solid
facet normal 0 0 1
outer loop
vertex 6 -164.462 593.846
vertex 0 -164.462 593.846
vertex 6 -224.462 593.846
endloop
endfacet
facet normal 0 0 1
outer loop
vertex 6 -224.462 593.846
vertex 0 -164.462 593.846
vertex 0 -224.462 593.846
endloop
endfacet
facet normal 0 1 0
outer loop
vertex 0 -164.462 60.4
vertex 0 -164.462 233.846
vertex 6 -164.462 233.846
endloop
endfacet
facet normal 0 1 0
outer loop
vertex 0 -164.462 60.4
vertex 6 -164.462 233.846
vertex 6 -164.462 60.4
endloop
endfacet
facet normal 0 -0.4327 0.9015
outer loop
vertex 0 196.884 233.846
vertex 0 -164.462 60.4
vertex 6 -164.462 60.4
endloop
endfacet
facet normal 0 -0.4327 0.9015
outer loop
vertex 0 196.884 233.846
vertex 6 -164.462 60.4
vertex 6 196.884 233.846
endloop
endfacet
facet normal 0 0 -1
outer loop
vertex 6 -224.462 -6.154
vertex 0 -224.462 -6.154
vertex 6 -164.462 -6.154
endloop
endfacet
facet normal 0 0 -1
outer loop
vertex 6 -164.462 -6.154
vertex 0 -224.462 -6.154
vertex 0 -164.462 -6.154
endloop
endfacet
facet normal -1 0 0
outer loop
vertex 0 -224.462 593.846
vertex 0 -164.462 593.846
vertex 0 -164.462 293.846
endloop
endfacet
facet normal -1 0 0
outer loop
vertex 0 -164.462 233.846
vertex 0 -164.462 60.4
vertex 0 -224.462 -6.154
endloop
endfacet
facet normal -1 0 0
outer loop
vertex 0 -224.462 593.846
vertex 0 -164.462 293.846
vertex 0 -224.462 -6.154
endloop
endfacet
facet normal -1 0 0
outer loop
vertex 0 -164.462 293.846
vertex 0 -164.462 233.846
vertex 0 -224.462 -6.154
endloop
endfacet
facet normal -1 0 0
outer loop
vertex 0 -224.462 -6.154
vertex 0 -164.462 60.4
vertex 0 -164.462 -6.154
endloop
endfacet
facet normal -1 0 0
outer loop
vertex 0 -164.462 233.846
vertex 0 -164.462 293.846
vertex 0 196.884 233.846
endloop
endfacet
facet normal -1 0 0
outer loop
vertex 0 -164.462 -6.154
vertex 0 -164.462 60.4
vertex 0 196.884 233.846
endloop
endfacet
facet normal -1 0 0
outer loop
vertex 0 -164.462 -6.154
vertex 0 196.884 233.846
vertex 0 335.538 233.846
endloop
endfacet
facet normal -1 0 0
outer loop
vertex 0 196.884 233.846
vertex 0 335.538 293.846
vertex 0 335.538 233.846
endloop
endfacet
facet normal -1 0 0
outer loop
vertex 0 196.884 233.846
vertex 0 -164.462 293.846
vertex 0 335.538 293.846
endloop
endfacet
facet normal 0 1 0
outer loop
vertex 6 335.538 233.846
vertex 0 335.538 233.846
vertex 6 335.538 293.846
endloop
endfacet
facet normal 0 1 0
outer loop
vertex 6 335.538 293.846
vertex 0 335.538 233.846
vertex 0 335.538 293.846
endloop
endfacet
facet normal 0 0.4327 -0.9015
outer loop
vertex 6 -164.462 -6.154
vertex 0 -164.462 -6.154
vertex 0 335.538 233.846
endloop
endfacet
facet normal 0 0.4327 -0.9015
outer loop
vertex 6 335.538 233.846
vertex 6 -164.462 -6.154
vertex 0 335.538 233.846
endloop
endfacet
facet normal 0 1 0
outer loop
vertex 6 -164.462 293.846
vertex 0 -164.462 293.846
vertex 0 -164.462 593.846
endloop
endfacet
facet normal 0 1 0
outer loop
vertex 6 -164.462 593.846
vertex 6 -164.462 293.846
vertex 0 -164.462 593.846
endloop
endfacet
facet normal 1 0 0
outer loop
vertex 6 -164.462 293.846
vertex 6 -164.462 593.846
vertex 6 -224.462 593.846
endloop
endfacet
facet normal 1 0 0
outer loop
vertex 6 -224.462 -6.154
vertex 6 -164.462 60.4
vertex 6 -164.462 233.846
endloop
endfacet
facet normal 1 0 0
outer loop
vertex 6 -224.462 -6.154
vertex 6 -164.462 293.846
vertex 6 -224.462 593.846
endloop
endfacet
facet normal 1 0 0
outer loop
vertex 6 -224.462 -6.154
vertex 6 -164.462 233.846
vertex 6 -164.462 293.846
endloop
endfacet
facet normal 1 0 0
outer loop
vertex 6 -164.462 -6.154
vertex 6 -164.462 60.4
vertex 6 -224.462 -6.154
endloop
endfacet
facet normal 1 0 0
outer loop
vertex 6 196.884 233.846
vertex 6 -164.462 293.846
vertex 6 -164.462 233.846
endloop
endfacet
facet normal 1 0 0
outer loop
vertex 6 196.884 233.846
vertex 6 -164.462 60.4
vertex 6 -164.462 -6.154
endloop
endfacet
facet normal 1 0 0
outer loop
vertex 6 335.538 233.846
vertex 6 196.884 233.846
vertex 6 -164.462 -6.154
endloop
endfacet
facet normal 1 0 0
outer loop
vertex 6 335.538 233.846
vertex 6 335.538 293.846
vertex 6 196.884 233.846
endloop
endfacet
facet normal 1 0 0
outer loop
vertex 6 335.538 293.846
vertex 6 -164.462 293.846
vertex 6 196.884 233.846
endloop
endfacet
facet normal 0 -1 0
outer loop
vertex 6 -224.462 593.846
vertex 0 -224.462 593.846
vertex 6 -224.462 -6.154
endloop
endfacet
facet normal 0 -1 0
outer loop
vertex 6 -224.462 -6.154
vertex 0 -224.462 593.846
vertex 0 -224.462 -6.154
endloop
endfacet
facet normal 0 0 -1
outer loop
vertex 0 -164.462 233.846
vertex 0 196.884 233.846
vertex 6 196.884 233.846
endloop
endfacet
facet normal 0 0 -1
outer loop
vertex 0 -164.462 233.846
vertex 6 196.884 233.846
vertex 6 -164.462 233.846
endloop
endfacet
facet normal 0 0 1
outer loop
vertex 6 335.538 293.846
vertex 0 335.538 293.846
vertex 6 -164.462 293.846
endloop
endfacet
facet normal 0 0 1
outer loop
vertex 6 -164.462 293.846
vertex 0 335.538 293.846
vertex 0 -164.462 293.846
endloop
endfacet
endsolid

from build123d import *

# Parameters (mm, degrees)
EXTRUDE_500_DEPTH = 6


with BuildPart() as part:
    # Sketch 492 → Extrude 500 (new body)
    with BuildSketch(Plane(origin=(0, 0, 0), x_dir=(0, 0, -1), z_dir=(1, 0, 0))):
        Polygon((-593.846153846, -224.461538462), (6.153846154, -224.461538462), (6.153846154, -164.461538462), (-233.846153846, 335.538461538), (-293.846153846, 335.538461538), (-293.846153846, -164.461538462), (-593.846153846, -164.461538462), align=None)
        Polygon((-233.846153846, -164.461538462), (-60.400192041, -164.461538462), (-233.846153846, 196.8842153), align=None, mode=Mode.SUBTRACT)
    extrude(amount=EXTRUDE_500_DEPTH)


solid = part.part
